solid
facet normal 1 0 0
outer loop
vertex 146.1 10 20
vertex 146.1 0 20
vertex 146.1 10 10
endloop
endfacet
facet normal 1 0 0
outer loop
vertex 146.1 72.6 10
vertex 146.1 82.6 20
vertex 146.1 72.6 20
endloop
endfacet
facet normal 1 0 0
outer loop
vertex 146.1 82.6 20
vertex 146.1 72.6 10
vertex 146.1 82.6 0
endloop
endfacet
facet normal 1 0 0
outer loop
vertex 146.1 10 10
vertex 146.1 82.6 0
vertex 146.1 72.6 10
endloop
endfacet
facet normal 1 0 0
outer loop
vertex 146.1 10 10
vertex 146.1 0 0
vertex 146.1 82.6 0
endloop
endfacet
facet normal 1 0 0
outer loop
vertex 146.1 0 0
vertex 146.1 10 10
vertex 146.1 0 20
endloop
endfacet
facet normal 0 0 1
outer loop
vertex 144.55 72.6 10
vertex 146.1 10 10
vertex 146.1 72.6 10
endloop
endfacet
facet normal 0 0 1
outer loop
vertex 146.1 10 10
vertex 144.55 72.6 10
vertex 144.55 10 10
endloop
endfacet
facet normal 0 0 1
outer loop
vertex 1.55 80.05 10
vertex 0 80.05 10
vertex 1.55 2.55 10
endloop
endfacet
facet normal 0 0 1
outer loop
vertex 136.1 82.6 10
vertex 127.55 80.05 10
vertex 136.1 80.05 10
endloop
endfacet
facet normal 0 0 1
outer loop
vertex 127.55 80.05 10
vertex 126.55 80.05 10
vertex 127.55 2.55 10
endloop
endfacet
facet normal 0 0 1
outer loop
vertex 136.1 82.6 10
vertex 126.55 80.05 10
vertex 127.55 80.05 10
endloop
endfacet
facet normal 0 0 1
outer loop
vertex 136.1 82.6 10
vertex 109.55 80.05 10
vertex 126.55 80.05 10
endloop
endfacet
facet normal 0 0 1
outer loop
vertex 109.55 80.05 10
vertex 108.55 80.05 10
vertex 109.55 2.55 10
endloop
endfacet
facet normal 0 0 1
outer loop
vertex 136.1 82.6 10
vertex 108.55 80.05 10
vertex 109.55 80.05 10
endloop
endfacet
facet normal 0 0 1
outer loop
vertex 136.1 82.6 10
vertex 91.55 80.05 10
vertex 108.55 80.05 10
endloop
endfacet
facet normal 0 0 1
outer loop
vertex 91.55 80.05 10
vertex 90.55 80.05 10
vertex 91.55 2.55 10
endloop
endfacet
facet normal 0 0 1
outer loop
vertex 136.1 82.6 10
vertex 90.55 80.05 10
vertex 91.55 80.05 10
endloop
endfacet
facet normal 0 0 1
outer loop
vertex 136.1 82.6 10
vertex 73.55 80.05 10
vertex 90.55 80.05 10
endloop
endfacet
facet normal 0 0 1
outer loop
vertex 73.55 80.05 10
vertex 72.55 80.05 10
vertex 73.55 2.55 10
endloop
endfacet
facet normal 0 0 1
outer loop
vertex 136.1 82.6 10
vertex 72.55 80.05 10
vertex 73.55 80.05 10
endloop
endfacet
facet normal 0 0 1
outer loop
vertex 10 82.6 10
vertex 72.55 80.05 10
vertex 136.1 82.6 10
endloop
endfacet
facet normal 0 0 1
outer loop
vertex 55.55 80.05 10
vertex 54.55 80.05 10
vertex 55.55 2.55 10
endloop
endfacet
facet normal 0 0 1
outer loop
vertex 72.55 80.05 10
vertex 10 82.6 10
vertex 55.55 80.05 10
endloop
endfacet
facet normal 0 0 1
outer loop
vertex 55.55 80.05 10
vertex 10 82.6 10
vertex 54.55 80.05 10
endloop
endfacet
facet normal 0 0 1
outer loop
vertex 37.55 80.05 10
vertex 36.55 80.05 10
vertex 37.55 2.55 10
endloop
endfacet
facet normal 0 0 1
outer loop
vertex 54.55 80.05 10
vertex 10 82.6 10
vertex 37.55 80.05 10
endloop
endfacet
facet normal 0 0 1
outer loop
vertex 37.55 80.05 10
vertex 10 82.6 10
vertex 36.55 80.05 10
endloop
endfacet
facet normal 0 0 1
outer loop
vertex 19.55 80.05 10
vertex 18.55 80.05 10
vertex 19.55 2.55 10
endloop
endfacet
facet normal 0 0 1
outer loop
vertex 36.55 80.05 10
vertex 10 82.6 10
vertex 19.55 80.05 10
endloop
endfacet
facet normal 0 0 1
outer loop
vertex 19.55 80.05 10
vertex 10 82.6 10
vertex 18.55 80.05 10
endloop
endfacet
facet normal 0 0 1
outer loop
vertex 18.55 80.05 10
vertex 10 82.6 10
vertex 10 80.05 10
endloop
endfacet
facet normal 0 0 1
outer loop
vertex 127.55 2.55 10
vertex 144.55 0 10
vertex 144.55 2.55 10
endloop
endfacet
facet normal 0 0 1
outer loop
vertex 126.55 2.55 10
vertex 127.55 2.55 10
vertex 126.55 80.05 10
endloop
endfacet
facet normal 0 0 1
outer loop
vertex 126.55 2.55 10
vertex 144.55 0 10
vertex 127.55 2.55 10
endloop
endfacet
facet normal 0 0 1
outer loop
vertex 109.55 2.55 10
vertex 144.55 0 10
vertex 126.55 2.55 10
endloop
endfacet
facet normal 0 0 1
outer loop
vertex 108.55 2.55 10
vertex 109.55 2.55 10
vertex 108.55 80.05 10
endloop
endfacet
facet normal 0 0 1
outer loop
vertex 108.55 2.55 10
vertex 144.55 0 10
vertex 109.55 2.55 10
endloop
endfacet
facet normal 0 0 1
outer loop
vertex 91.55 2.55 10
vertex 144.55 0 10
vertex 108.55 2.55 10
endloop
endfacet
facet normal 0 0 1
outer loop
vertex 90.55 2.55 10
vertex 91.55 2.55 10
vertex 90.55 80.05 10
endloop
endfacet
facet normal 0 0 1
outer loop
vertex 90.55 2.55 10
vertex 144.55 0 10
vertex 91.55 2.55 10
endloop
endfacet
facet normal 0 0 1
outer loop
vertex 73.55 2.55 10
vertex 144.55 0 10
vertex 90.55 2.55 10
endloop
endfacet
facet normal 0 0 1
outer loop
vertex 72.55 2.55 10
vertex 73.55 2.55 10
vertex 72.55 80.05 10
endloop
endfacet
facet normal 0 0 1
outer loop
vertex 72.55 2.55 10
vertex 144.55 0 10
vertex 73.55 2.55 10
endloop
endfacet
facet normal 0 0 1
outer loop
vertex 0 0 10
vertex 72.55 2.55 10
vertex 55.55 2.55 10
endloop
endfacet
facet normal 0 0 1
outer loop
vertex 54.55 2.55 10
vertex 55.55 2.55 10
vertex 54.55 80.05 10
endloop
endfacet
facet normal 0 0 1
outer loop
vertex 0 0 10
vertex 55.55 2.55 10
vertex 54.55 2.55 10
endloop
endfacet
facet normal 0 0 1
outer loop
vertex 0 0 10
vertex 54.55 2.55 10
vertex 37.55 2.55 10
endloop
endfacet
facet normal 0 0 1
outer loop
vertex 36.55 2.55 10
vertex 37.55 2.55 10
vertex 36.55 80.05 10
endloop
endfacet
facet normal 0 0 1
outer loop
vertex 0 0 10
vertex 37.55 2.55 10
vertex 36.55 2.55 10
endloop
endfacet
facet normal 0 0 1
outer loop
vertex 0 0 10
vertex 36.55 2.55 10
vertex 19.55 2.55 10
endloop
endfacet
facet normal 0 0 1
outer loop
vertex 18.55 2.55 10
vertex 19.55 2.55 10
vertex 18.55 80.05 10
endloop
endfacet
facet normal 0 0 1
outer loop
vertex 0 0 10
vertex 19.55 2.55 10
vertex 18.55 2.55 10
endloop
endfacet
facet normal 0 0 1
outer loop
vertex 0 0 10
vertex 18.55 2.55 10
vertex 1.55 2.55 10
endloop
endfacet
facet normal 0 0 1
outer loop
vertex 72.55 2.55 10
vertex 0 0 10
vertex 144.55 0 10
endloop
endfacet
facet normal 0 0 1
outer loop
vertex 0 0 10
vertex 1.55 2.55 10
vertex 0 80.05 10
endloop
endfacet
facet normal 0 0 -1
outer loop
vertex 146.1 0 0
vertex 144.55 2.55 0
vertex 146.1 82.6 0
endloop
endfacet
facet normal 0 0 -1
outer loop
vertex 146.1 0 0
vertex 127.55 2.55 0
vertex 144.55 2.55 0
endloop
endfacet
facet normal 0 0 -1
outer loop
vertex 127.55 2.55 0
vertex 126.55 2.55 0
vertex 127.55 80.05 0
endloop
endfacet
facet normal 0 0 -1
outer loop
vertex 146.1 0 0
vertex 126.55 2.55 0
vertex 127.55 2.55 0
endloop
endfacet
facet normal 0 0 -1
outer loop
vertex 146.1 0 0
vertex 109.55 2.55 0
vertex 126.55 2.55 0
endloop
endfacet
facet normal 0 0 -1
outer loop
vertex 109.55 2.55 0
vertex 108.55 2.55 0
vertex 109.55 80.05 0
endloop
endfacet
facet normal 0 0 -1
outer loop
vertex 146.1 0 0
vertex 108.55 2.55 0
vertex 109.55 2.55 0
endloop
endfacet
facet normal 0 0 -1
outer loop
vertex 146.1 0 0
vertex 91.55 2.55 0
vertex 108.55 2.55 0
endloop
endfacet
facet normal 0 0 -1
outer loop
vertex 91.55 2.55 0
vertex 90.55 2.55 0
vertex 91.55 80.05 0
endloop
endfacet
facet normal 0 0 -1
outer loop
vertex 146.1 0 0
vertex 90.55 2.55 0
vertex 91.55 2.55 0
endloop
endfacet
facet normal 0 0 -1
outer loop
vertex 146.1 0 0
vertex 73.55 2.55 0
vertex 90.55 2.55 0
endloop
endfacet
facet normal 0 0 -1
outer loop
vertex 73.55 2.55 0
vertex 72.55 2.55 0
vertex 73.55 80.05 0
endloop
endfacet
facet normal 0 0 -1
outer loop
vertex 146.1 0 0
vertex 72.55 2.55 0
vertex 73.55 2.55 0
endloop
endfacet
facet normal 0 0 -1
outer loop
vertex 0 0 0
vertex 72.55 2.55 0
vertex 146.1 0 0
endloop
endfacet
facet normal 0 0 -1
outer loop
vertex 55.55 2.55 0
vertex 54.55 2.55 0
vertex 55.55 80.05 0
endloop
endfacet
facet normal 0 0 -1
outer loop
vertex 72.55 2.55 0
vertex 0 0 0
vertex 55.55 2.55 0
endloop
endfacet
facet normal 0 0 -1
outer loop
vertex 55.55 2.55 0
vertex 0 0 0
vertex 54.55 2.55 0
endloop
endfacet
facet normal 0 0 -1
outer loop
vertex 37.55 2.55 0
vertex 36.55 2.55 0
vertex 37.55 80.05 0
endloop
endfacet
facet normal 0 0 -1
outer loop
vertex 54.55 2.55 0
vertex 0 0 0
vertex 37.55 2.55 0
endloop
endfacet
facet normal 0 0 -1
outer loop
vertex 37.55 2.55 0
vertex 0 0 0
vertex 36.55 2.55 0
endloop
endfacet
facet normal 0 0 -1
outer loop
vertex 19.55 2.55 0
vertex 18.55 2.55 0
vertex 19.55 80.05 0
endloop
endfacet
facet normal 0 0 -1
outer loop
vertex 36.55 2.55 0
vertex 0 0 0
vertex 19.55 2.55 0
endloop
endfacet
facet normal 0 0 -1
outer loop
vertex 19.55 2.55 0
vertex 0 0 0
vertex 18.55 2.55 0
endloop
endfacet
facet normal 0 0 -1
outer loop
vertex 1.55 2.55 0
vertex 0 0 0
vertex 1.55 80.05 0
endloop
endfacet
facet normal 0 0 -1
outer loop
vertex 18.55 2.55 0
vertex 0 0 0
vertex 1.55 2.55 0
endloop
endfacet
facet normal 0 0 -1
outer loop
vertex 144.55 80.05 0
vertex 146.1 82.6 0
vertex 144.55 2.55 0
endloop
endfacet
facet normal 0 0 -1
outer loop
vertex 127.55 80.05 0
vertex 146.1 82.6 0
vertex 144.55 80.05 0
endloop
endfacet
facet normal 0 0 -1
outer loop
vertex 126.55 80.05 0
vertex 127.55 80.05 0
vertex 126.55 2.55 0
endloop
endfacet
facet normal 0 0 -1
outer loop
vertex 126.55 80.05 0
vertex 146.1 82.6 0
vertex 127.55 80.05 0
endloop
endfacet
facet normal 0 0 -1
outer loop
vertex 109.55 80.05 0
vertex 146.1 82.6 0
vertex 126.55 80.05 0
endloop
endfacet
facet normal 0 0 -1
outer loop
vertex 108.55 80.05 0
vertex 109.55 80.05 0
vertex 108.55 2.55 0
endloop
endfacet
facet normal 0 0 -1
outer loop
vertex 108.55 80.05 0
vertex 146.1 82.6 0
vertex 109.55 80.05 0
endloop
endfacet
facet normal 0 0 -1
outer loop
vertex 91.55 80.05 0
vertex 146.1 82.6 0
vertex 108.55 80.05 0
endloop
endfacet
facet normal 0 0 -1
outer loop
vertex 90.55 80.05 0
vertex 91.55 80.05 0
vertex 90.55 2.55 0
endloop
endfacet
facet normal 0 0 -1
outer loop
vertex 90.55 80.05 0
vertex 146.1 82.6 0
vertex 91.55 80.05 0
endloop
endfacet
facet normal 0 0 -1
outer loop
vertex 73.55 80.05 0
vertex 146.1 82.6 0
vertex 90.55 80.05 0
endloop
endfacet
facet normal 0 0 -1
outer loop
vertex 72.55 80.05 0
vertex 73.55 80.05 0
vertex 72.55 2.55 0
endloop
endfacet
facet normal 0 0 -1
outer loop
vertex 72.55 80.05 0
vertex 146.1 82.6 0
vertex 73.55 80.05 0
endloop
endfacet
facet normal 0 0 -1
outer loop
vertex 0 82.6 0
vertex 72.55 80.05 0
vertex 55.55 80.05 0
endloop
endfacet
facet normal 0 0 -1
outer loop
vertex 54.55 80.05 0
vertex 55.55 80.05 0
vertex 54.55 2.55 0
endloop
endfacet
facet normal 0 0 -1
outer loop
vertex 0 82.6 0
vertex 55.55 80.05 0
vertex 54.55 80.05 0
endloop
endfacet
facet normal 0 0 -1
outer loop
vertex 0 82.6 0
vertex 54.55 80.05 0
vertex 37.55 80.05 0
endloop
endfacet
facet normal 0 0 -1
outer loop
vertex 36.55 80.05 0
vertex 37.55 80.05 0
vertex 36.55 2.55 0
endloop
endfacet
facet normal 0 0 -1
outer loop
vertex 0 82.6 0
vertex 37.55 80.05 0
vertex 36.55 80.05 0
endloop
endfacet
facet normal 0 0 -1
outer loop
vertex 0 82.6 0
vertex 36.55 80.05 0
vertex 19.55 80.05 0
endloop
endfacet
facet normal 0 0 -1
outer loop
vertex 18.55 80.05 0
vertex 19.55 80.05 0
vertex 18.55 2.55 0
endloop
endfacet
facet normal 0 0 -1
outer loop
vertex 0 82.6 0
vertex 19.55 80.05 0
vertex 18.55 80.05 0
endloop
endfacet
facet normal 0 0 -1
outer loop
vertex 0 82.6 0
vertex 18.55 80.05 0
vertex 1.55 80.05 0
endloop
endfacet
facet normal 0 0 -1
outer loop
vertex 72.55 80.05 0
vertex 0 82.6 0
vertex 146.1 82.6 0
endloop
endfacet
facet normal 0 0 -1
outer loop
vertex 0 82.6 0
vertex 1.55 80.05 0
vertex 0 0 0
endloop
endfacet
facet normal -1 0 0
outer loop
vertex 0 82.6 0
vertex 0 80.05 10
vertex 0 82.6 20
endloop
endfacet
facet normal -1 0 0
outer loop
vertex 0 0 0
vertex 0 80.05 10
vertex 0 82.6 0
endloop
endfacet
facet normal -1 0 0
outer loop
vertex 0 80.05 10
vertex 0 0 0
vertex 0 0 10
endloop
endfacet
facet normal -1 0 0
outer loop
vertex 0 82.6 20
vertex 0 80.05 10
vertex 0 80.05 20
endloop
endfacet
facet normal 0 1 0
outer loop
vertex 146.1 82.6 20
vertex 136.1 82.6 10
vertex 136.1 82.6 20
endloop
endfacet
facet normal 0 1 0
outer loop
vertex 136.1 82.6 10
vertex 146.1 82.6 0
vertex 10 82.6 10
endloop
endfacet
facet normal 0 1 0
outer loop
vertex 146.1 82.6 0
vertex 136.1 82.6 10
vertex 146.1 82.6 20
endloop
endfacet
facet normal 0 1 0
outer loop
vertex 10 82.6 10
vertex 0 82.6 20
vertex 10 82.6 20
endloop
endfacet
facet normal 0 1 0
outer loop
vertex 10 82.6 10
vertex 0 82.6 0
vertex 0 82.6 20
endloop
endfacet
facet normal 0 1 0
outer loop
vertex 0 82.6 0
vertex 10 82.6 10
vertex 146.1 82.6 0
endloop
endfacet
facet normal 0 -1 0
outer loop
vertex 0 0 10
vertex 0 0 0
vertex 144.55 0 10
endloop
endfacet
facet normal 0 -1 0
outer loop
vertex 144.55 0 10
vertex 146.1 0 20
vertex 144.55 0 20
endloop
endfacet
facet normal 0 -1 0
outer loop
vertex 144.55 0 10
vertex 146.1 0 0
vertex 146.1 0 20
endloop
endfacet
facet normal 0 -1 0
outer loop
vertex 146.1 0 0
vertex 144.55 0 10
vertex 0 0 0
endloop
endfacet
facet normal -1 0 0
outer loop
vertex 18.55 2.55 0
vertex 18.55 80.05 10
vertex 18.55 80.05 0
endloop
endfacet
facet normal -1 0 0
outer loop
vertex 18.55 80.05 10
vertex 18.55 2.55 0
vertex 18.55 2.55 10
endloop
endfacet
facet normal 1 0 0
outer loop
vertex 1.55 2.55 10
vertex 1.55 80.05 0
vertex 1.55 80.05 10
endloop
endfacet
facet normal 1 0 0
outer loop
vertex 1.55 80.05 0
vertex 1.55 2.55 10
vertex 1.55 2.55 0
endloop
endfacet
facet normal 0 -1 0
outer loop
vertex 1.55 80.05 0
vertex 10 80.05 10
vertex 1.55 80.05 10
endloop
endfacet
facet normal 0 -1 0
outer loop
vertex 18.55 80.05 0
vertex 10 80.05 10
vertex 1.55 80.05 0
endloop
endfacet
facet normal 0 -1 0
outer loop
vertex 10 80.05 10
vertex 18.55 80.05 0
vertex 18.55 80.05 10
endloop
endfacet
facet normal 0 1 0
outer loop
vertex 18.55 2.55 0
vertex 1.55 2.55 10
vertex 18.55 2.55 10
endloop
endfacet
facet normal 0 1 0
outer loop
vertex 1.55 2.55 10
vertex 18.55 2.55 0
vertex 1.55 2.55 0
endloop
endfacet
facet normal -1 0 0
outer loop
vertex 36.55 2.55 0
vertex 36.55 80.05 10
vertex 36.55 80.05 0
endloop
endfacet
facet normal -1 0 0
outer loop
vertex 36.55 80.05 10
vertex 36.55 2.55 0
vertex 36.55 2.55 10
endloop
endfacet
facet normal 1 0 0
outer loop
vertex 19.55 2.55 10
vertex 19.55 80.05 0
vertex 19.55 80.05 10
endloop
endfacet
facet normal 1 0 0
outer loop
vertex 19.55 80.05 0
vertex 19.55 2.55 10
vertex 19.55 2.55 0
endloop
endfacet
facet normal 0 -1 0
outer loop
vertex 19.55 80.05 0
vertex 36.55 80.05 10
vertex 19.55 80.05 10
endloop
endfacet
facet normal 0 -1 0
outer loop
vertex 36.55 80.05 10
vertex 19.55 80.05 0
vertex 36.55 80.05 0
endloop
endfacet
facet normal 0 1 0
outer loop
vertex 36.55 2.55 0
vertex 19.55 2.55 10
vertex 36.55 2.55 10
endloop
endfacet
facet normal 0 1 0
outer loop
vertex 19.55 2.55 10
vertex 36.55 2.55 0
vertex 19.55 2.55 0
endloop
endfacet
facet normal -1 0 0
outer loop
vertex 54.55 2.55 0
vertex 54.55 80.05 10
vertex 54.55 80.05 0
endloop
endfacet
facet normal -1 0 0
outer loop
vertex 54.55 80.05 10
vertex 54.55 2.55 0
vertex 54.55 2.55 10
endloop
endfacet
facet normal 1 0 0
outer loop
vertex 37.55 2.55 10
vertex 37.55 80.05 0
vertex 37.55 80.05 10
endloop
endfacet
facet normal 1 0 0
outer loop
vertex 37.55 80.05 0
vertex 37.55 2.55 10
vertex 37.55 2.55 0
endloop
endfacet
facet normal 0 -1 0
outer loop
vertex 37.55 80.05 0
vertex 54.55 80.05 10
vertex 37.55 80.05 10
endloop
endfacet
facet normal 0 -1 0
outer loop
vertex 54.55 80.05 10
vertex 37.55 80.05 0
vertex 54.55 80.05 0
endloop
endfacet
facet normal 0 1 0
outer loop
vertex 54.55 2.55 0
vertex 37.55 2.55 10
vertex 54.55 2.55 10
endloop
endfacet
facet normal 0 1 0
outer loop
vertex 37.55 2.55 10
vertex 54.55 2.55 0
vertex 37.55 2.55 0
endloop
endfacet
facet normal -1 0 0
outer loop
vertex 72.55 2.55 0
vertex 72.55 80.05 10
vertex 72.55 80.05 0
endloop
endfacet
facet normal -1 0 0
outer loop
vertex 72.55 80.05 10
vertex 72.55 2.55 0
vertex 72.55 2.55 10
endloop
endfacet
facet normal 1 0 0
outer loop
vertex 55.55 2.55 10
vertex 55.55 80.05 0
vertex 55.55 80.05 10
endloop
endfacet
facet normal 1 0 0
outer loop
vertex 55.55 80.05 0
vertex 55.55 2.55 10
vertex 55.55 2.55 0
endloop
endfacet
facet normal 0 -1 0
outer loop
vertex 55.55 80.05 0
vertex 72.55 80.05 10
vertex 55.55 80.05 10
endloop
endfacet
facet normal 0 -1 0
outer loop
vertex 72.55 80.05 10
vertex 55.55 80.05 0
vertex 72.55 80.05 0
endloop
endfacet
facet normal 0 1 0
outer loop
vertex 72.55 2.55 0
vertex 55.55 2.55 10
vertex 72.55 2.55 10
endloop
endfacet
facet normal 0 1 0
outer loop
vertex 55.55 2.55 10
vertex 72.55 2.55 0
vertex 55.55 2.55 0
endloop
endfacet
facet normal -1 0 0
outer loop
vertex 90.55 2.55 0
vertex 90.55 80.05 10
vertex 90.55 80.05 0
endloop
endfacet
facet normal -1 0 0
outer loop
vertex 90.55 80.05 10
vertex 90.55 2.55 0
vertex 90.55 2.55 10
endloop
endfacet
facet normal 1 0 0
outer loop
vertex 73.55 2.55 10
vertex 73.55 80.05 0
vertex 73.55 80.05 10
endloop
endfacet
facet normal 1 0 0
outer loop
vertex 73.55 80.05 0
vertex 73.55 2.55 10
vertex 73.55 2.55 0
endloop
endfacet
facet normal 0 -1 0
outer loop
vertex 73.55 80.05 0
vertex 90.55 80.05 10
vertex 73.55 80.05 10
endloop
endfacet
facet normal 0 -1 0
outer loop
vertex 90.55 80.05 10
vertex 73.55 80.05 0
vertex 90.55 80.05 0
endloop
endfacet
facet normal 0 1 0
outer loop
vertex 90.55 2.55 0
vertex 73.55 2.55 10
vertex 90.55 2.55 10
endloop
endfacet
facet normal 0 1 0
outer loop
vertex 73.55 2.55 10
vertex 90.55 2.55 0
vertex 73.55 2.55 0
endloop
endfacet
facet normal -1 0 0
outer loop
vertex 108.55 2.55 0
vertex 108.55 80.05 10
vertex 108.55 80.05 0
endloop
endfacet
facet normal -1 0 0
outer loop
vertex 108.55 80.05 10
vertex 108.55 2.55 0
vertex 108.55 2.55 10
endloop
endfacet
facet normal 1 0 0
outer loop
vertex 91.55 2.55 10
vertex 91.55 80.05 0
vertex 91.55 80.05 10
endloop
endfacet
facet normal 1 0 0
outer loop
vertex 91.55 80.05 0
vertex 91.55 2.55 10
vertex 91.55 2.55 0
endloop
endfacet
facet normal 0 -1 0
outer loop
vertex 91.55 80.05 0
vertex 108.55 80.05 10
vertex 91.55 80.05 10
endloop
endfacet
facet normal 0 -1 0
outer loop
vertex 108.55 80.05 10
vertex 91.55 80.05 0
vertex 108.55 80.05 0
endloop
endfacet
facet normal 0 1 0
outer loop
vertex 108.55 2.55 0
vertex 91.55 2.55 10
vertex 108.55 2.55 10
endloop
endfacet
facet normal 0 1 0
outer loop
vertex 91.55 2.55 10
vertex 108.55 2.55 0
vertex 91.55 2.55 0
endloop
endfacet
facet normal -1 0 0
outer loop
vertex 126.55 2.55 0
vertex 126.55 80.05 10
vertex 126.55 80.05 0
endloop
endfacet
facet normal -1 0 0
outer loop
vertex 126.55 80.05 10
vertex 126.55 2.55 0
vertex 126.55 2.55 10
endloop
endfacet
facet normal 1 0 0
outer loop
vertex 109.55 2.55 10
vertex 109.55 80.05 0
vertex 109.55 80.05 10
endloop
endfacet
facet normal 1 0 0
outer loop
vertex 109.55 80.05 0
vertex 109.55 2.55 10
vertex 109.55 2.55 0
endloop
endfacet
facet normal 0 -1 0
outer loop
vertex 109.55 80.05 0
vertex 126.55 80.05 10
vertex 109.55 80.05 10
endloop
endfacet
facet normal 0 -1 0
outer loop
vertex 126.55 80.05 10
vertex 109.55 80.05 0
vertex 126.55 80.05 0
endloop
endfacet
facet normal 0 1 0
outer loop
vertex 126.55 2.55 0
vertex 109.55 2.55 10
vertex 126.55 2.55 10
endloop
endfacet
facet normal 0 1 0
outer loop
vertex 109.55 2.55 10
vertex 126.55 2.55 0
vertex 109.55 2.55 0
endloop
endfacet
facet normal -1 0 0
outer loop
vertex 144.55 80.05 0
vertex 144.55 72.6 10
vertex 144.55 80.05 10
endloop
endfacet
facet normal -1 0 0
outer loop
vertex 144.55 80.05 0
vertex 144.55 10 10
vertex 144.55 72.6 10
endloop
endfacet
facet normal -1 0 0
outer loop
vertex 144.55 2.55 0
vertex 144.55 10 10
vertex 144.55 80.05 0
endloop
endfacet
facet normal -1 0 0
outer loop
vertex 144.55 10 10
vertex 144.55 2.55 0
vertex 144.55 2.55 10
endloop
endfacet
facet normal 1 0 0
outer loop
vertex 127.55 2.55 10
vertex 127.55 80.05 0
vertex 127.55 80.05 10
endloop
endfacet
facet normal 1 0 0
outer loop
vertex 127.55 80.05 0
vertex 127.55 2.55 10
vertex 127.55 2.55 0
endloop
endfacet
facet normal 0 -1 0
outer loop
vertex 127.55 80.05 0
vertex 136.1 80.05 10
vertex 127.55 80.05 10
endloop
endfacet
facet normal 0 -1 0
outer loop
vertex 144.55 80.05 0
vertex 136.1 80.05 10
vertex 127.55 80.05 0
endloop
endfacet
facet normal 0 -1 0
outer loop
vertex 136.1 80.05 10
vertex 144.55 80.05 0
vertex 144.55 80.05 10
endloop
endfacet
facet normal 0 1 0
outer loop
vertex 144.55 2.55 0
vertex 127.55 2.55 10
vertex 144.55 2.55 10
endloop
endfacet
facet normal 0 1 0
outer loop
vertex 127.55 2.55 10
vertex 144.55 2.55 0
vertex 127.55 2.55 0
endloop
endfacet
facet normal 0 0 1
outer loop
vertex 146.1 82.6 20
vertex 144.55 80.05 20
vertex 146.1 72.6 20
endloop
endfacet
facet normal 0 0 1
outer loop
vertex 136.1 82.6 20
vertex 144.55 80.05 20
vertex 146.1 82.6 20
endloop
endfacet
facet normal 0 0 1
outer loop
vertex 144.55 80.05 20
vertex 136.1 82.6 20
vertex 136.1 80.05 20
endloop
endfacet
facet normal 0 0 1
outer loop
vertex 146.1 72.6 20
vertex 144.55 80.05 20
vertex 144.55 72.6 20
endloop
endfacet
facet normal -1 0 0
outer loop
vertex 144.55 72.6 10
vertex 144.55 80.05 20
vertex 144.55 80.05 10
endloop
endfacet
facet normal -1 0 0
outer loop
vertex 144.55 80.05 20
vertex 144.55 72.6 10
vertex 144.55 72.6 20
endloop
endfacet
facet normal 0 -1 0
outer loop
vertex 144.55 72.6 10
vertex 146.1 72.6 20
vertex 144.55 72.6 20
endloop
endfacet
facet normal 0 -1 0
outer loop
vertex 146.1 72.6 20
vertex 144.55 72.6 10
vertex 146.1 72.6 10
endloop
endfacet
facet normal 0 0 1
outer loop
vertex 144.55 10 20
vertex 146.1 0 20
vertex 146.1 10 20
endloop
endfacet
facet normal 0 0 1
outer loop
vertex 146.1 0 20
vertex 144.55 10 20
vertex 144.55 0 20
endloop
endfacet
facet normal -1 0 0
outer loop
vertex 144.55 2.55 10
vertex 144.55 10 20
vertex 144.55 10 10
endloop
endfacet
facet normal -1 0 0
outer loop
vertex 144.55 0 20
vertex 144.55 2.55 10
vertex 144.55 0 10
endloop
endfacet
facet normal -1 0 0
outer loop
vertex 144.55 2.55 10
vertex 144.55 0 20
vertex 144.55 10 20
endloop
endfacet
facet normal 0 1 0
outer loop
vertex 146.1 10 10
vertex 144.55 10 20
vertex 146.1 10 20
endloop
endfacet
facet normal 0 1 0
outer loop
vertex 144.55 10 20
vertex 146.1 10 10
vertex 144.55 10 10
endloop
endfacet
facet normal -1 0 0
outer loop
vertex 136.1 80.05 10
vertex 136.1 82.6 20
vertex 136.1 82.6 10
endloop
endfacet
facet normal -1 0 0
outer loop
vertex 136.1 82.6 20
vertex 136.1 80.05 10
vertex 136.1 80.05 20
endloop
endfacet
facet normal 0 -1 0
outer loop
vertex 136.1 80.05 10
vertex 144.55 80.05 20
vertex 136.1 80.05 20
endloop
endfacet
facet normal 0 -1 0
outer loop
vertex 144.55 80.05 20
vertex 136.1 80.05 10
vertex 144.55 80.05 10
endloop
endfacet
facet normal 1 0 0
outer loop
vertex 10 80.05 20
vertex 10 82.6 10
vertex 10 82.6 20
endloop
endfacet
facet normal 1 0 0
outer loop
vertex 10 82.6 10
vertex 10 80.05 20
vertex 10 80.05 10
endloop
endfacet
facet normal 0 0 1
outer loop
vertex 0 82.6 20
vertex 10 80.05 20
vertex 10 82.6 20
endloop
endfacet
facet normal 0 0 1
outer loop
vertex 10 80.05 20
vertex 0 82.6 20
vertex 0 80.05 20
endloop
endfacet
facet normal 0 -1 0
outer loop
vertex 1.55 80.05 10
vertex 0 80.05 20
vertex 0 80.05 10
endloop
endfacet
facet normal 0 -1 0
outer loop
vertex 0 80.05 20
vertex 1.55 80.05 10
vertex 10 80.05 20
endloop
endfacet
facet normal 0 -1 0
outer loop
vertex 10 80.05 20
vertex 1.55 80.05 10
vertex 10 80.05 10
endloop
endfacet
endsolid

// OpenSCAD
/*
    created 7 Feb 2021
    modified 7 Feb 2021 - correct the dimms and add bay dividors 
    modified 7 Feb 2021 - adding 
    
    by Matt Jones (Crazy-Logic)  
    This example code is in the public domain.
    
    dual 5 in bays  
    
    //drive bay size 41.3 mm by 146.1 mm and upto 203.2 mm deep  
*/

//sizes 
cwidth = 77.5; //think need to be 77.5
cheight= 17; //

width = 146.1;
depth = 82.6; 
height = 10;

bayw = 143; //was 140... 
bayh = 77.5;

woff = (width-bayw)/2;
hoff = (depth-bayh)/2;

//disks are 140 wide.... 



difference(){
    cube([width,depth,height]);
    //cutout for drive
    //translate([woff,hoff,-1])
    //cube([bayw,bayh,5+2]);
    
    translate([woff,hoff,-1])
    cube([cheight,cwidth,height+2]);
    
    translate([woff+cheight+1,hoff,-1])
    cube([cheight,cwidth,height+2]);
    
    translate([woff+2*cheight+2,hoff,-1])
    cube([cheight,cwidth,height+2]);
    
    translate([woff+3*cheight+3,hoff,-1])
    cube([cheight,cwidth,height+2]);
    
    translate([woff+4*cheight+4,hoff,-1])
    cube([cheight,cwidth,height+2]);
    
    translate([woff+5*cheight+5,hoff,-1])
    cube([cheight,cwidth,height+2]);
    
    translate([woff+6*cheight+6,hoff,-1])
    cube([cheight,cwidth,height+2]);
    
    translate([woff+7*cheight+7,hoff,-1])
    cube([cheight,cwidth,height+2]);
}

translate([width-woff,depth-10,height])
cube([woff,10,10]);
translate([width-woff,0,height])
cube([woff,10,10]);

translate([width-10,depth-hoff,height])
cube([10,hoff,10]);

translate([0,depth-hoff,height])
cube([10,hoff,10]);
